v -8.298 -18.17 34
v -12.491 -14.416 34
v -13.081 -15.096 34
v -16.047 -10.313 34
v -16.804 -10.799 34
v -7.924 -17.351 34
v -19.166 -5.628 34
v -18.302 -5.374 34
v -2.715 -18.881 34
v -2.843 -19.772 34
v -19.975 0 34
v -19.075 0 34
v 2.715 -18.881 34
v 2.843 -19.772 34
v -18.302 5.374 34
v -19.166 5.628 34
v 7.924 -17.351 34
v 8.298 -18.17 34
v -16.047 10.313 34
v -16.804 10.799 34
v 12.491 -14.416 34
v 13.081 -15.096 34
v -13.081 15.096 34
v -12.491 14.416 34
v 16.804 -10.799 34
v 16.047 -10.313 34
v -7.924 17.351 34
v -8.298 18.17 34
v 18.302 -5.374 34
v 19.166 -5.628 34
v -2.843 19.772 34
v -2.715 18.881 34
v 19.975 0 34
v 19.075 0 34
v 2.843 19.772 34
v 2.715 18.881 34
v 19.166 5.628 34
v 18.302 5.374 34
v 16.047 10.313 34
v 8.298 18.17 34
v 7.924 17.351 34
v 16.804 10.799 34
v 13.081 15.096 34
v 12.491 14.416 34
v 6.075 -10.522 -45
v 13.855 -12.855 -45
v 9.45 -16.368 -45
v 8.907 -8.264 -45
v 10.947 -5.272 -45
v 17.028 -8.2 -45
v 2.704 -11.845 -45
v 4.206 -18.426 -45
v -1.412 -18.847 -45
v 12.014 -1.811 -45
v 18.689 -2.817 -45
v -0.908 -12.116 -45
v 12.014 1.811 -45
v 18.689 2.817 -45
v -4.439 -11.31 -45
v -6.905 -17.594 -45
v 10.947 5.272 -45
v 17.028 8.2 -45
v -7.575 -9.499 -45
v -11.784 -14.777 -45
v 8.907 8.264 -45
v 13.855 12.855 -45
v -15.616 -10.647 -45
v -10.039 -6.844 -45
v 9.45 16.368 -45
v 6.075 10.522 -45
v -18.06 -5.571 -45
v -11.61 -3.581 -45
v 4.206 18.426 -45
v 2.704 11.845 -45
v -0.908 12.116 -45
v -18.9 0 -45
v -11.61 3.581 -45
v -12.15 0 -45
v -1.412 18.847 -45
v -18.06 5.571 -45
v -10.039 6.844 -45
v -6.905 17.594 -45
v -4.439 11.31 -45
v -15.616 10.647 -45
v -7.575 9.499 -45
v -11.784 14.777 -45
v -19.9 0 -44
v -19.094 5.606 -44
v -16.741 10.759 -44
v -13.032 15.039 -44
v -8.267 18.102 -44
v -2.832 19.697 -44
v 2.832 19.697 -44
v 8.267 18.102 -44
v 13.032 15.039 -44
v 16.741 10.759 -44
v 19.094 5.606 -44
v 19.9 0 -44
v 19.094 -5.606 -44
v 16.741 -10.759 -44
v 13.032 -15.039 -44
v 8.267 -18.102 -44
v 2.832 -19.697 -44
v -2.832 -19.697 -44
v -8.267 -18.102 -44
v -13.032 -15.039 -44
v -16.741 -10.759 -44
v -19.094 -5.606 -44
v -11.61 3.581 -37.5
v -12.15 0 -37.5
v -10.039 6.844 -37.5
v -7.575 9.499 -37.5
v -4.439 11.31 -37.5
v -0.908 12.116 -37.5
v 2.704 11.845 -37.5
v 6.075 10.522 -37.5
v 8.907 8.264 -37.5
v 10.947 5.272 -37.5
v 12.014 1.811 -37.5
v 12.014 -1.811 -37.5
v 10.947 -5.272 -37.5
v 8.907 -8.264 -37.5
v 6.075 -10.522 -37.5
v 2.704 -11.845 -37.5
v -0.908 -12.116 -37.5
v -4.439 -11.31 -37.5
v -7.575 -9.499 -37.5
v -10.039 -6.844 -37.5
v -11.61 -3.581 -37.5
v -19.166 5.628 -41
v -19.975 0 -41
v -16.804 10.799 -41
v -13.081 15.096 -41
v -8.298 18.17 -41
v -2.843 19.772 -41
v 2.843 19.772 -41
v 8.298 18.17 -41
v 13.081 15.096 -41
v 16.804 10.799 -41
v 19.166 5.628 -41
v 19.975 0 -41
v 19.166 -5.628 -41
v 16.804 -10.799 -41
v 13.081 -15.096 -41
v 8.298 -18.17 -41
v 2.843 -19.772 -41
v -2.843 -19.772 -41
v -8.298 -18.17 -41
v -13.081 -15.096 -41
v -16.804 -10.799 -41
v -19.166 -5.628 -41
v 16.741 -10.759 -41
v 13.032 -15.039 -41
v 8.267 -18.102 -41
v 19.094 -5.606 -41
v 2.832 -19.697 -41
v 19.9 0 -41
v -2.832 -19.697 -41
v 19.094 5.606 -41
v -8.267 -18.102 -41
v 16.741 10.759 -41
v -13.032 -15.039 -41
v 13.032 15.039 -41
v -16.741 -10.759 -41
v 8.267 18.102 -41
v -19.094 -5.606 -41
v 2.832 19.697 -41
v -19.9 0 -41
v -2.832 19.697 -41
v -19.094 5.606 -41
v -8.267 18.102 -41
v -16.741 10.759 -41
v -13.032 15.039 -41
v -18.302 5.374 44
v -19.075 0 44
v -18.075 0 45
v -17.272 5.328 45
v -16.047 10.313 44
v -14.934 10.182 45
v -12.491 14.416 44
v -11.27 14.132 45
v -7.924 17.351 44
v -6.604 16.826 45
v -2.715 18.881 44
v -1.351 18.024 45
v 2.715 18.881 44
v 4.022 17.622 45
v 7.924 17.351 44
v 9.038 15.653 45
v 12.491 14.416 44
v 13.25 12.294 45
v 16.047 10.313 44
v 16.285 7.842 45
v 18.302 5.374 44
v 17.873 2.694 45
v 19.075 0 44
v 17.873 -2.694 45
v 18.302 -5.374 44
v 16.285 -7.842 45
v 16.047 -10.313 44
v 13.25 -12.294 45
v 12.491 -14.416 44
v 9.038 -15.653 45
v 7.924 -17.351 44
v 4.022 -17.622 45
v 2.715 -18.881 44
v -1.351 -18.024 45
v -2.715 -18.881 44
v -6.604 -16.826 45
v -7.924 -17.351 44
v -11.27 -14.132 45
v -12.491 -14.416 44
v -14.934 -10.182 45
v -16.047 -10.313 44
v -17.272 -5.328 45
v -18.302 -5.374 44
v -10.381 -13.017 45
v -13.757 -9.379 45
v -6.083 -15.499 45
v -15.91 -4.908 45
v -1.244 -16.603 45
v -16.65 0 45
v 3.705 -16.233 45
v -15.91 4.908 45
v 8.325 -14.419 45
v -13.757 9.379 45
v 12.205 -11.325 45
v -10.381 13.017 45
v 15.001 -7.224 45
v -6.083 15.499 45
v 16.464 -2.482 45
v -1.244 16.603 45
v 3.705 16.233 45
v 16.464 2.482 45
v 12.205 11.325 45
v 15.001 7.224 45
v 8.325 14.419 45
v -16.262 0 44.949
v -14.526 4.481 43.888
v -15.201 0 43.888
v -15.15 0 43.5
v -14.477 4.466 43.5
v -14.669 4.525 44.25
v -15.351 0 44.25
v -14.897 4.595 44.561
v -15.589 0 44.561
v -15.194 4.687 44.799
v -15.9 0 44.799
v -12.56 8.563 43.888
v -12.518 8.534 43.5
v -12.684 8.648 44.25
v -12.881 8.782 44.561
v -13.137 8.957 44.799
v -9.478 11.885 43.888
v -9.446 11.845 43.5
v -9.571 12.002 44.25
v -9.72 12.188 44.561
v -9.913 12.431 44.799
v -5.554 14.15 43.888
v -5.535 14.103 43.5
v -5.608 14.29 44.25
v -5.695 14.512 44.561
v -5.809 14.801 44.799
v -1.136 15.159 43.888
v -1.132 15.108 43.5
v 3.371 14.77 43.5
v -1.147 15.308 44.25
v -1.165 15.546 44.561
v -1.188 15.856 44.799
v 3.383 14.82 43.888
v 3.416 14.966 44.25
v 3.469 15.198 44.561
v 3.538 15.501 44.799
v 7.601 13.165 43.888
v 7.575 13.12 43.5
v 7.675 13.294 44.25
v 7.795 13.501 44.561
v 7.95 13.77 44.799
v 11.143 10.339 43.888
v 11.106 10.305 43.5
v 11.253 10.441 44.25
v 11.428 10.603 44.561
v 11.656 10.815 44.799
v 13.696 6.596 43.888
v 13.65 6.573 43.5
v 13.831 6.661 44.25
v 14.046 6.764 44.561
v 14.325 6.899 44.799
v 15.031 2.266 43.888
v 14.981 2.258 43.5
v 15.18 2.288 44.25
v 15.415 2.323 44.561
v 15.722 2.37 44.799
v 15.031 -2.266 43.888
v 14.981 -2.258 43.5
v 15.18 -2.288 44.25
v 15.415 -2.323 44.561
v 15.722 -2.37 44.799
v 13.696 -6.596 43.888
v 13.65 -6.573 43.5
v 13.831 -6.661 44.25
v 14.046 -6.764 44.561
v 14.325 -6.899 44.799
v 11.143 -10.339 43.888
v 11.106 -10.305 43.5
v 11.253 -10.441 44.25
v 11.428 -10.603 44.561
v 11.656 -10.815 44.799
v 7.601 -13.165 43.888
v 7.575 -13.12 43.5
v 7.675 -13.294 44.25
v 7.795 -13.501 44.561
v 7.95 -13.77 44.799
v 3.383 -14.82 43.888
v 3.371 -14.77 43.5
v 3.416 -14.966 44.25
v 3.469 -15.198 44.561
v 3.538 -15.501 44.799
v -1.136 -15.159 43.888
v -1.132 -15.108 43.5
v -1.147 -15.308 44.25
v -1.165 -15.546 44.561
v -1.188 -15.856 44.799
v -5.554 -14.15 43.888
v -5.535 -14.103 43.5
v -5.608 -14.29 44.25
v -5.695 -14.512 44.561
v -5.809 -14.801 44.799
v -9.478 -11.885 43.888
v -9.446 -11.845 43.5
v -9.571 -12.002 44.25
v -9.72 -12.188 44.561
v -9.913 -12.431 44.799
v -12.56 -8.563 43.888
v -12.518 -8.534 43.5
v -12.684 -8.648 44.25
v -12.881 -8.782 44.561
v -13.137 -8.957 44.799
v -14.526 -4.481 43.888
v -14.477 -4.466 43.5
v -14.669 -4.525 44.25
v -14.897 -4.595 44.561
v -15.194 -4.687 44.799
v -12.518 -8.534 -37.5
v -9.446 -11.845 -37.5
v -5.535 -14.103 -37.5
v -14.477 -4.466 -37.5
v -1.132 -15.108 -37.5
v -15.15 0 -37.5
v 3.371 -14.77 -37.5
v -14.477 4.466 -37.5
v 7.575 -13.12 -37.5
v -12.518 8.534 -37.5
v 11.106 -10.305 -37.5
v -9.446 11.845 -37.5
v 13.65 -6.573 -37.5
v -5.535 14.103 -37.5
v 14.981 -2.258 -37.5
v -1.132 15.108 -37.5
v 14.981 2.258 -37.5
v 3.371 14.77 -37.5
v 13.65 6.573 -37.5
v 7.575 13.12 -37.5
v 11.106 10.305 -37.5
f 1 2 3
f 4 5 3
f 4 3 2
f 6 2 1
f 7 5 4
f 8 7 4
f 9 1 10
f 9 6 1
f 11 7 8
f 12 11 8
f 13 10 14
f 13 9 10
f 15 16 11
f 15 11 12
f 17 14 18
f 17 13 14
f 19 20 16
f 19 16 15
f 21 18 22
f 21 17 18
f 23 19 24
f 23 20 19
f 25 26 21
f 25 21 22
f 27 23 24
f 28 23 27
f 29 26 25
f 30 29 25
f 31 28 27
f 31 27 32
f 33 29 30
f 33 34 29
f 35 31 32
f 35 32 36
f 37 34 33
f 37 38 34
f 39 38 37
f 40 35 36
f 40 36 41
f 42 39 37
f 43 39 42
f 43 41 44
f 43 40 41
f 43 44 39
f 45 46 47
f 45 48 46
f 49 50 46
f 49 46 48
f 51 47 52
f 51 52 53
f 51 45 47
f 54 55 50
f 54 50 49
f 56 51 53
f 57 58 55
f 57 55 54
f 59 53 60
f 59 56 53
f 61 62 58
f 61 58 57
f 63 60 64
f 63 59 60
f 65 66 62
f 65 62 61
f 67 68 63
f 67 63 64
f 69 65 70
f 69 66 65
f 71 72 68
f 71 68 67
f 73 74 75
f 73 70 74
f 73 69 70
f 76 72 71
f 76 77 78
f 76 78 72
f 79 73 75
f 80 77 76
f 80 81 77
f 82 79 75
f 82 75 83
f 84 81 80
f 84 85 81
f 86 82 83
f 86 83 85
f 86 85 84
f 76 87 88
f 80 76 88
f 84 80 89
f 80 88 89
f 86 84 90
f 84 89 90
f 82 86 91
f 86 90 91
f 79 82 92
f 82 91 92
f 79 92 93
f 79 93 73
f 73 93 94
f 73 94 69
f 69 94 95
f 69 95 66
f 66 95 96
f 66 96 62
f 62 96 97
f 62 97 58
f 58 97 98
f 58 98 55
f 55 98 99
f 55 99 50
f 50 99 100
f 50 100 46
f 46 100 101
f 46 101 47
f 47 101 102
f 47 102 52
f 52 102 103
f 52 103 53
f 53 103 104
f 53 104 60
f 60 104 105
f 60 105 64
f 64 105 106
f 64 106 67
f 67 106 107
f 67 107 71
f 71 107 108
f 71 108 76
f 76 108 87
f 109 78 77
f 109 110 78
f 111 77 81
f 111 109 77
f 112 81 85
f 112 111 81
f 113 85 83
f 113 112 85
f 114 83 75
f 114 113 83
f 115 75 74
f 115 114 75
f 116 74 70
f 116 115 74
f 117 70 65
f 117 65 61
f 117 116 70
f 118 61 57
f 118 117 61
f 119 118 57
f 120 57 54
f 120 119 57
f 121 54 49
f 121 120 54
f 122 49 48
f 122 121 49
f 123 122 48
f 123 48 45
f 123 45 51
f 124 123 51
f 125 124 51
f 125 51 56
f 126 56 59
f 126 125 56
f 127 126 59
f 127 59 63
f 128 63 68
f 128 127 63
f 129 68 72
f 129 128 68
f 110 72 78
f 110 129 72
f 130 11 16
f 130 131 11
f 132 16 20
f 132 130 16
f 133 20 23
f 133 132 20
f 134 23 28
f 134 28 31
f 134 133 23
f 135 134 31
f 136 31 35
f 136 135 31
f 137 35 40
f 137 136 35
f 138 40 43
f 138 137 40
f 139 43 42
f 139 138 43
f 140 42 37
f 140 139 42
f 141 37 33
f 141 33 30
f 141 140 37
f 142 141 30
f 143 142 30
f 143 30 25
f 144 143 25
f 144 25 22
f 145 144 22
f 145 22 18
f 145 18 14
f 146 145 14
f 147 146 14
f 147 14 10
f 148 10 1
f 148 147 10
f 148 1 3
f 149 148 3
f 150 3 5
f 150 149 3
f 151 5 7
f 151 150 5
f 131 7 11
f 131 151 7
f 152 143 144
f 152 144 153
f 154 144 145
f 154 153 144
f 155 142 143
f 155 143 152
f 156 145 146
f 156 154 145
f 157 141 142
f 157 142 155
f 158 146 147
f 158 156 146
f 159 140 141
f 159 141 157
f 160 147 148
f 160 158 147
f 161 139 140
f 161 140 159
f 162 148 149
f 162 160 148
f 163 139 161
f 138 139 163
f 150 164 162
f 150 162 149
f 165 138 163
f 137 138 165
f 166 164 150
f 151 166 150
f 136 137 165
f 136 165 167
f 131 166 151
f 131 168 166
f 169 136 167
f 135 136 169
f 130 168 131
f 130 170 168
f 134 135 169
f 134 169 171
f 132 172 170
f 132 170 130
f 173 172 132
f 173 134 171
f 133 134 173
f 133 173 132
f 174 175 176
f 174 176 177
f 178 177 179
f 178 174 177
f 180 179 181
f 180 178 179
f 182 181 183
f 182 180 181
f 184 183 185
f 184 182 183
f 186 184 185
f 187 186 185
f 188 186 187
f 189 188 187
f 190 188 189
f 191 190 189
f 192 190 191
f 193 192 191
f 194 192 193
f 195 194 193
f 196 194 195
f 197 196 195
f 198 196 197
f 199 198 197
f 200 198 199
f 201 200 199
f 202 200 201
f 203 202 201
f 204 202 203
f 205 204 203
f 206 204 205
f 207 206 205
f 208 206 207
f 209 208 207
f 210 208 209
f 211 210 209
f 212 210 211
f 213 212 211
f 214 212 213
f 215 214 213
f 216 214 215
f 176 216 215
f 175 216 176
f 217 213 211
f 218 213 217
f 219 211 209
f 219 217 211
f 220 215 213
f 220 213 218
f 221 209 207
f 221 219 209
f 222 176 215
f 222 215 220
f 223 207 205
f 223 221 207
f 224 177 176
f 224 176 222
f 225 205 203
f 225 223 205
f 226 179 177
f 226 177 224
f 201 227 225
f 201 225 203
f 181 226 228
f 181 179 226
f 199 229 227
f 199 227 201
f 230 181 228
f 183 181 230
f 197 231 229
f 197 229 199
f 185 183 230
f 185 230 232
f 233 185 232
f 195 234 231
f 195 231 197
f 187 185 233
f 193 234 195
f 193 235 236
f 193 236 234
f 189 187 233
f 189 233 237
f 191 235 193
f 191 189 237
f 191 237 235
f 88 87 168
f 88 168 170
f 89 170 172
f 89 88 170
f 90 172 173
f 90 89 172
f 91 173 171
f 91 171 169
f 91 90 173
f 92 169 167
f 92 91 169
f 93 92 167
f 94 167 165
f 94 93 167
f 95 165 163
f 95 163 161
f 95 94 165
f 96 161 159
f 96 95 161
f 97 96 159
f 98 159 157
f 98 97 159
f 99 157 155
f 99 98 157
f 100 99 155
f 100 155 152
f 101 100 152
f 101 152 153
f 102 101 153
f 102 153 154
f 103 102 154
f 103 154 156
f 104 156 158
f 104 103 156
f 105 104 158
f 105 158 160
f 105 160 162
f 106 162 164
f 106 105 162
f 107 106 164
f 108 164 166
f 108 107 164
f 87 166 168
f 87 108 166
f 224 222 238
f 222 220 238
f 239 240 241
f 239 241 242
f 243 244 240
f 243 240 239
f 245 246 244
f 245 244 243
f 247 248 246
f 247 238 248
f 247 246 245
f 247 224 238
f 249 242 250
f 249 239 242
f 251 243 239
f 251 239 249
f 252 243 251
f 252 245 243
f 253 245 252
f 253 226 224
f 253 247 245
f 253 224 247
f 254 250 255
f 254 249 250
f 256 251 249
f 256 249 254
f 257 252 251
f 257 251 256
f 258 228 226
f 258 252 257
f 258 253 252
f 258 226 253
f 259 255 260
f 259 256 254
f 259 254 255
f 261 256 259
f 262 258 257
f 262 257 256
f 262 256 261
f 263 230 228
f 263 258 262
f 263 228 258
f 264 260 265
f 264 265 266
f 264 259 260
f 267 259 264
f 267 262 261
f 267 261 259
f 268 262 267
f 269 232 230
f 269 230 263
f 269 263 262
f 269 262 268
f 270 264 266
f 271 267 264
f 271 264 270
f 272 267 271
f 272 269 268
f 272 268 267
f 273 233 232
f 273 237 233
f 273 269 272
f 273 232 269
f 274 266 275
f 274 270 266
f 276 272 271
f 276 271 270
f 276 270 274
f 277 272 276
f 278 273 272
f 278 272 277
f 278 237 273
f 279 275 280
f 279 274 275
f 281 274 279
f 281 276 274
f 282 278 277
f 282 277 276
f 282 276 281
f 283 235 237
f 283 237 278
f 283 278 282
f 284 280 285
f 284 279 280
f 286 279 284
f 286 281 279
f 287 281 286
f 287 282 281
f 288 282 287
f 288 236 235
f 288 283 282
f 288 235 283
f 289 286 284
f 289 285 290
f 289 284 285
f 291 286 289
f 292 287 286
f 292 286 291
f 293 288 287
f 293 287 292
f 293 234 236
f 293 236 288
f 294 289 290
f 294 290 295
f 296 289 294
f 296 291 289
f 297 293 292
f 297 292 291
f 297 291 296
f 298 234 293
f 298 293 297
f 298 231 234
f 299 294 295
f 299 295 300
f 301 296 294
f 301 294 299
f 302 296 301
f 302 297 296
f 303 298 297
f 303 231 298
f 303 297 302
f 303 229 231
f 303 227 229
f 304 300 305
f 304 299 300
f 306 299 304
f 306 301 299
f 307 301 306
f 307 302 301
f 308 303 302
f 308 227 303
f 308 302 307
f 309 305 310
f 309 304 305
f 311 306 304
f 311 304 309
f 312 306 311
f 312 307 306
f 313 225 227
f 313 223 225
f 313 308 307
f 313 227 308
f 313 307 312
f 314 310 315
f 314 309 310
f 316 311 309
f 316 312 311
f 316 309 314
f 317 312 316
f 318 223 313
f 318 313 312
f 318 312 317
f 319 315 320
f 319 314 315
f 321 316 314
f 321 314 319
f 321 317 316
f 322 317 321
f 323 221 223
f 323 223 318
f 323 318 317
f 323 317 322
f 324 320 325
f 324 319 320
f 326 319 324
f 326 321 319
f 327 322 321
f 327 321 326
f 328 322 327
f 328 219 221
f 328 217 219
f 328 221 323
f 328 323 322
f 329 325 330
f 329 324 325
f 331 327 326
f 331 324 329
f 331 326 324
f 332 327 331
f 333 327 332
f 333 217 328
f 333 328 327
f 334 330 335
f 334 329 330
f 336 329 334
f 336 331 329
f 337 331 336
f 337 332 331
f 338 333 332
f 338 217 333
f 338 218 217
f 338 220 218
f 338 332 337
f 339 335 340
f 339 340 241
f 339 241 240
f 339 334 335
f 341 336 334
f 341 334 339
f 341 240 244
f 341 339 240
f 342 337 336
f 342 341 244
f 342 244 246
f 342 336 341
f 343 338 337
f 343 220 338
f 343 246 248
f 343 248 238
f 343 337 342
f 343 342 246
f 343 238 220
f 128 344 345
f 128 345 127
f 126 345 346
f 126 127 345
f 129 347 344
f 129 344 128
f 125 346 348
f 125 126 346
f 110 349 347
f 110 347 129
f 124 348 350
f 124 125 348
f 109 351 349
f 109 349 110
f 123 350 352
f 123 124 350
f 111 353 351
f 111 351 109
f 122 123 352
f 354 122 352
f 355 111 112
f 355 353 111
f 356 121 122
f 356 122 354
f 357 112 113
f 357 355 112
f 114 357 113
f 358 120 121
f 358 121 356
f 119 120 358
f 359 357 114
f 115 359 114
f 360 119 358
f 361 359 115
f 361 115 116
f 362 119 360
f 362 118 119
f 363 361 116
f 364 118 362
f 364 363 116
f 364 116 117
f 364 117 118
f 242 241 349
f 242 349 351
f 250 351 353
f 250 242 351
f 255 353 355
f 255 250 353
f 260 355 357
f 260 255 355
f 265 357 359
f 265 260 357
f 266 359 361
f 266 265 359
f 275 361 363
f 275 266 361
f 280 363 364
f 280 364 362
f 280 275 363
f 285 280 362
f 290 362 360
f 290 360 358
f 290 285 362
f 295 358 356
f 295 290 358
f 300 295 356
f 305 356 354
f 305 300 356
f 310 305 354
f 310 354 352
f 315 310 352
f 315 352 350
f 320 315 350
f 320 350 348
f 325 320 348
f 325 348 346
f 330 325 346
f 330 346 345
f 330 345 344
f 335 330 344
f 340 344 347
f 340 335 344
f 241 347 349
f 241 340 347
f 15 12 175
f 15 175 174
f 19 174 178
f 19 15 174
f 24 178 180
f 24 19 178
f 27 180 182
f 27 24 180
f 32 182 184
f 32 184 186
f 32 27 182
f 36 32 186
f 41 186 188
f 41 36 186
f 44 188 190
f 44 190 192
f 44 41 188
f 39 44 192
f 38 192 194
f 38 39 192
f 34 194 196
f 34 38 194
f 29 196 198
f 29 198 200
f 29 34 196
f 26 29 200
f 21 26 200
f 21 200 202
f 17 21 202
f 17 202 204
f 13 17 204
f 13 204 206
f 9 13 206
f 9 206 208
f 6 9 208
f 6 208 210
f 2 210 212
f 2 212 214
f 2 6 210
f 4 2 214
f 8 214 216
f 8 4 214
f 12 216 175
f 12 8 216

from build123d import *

# Parameters (mm, degrees)
F2_R    = 1.5
F3_SIZE = 1


with BuildPart() as f1:
    # F0 (on Front) → F1 (revolve)
    with BuildSketch(Plane.XZ):
        Polygon((-15.15, -37.5), (-15.15, 45), (-19.075, 45), (-19.075, 34), (-19.975, 34), (-19.975, -41), (-19.9, -41), (-19.9, -45), (-12.15, -45), (-12.15, -37.5), align=None)
    revolve(axis=Axis((0, 0, -0.782523), (0, 0, -1)))

    # F2
    f2_edges = [f1.edges().sort_by_distance(p)[0] for p in [
        (15.15, 0, 45),
    ]]
    fillet(f2_edges, radius=F2_R)

    # F3
    f3_edges = [f1.edges().sort_by_distance(p)[0] for p in [
        (19.075, 0, 45),
        (19.9, 0, -45),
    ]]
    chamfer(f3_edges, length=F3_SIZE)


solid = f1.part
